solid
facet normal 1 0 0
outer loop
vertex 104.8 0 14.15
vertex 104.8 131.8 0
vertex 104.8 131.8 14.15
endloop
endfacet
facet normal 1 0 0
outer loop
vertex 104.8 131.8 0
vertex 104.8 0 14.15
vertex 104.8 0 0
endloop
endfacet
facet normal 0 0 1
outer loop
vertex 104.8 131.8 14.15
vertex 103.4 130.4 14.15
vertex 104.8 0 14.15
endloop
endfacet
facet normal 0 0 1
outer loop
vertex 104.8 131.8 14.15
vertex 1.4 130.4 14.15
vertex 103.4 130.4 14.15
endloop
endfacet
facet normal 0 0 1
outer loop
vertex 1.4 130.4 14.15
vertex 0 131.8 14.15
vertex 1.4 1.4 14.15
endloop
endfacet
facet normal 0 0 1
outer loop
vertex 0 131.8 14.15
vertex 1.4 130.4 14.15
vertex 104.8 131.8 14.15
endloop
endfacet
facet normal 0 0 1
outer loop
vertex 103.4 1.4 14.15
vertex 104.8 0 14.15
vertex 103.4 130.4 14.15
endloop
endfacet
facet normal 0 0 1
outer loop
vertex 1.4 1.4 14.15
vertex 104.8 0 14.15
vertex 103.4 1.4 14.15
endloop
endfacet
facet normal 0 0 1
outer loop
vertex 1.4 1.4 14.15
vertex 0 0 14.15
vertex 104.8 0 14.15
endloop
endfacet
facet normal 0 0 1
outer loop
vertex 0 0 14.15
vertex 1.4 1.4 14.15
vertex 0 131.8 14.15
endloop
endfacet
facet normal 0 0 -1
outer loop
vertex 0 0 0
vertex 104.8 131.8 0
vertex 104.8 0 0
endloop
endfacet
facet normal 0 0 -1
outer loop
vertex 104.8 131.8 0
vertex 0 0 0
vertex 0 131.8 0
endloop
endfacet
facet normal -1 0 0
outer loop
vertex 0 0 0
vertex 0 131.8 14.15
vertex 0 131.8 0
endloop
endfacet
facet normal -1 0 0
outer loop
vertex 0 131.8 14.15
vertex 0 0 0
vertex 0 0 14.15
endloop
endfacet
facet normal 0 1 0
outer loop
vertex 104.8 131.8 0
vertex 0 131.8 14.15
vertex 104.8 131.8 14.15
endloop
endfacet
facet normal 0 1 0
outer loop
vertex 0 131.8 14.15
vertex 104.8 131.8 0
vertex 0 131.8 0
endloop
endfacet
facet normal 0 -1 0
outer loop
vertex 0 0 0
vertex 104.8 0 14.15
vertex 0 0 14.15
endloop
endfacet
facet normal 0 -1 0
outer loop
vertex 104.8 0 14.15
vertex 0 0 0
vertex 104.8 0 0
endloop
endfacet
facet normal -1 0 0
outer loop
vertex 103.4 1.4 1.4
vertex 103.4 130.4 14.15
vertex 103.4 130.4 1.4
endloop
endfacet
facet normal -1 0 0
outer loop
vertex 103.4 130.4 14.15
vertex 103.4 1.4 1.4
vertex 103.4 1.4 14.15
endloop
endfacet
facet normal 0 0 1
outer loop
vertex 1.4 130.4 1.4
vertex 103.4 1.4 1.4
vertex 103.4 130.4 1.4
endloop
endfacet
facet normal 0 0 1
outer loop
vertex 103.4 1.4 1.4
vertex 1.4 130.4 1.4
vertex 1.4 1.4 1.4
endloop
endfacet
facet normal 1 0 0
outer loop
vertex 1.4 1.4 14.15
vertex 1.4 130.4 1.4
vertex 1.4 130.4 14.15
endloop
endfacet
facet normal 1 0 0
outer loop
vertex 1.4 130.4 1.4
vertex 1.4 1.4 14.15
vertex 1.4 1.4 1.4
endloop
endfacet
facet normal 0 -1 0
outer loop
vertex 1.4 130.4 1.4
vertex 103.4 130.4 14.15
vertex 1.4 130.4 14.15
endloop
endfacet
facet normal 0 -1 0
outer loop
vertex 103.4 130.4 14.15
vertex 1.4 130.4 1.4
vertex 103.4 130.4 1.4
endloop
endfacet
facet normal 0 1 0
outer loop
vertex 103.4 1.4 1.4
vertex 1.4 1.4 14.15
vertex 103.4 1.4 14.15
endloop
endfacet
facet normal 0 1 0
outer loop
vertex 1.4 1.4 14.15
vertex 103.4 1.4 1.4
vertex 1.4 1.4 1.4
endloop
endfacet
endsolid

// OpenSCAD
//Postillon
w=102;
h=129;
t=1.4;
z=w/8;

difference()
{
    
    color("blue")
cube([w+t+t,h+t+t,z+t]);
    
translate([t,t,t])
cube([w,h,z]);


}
